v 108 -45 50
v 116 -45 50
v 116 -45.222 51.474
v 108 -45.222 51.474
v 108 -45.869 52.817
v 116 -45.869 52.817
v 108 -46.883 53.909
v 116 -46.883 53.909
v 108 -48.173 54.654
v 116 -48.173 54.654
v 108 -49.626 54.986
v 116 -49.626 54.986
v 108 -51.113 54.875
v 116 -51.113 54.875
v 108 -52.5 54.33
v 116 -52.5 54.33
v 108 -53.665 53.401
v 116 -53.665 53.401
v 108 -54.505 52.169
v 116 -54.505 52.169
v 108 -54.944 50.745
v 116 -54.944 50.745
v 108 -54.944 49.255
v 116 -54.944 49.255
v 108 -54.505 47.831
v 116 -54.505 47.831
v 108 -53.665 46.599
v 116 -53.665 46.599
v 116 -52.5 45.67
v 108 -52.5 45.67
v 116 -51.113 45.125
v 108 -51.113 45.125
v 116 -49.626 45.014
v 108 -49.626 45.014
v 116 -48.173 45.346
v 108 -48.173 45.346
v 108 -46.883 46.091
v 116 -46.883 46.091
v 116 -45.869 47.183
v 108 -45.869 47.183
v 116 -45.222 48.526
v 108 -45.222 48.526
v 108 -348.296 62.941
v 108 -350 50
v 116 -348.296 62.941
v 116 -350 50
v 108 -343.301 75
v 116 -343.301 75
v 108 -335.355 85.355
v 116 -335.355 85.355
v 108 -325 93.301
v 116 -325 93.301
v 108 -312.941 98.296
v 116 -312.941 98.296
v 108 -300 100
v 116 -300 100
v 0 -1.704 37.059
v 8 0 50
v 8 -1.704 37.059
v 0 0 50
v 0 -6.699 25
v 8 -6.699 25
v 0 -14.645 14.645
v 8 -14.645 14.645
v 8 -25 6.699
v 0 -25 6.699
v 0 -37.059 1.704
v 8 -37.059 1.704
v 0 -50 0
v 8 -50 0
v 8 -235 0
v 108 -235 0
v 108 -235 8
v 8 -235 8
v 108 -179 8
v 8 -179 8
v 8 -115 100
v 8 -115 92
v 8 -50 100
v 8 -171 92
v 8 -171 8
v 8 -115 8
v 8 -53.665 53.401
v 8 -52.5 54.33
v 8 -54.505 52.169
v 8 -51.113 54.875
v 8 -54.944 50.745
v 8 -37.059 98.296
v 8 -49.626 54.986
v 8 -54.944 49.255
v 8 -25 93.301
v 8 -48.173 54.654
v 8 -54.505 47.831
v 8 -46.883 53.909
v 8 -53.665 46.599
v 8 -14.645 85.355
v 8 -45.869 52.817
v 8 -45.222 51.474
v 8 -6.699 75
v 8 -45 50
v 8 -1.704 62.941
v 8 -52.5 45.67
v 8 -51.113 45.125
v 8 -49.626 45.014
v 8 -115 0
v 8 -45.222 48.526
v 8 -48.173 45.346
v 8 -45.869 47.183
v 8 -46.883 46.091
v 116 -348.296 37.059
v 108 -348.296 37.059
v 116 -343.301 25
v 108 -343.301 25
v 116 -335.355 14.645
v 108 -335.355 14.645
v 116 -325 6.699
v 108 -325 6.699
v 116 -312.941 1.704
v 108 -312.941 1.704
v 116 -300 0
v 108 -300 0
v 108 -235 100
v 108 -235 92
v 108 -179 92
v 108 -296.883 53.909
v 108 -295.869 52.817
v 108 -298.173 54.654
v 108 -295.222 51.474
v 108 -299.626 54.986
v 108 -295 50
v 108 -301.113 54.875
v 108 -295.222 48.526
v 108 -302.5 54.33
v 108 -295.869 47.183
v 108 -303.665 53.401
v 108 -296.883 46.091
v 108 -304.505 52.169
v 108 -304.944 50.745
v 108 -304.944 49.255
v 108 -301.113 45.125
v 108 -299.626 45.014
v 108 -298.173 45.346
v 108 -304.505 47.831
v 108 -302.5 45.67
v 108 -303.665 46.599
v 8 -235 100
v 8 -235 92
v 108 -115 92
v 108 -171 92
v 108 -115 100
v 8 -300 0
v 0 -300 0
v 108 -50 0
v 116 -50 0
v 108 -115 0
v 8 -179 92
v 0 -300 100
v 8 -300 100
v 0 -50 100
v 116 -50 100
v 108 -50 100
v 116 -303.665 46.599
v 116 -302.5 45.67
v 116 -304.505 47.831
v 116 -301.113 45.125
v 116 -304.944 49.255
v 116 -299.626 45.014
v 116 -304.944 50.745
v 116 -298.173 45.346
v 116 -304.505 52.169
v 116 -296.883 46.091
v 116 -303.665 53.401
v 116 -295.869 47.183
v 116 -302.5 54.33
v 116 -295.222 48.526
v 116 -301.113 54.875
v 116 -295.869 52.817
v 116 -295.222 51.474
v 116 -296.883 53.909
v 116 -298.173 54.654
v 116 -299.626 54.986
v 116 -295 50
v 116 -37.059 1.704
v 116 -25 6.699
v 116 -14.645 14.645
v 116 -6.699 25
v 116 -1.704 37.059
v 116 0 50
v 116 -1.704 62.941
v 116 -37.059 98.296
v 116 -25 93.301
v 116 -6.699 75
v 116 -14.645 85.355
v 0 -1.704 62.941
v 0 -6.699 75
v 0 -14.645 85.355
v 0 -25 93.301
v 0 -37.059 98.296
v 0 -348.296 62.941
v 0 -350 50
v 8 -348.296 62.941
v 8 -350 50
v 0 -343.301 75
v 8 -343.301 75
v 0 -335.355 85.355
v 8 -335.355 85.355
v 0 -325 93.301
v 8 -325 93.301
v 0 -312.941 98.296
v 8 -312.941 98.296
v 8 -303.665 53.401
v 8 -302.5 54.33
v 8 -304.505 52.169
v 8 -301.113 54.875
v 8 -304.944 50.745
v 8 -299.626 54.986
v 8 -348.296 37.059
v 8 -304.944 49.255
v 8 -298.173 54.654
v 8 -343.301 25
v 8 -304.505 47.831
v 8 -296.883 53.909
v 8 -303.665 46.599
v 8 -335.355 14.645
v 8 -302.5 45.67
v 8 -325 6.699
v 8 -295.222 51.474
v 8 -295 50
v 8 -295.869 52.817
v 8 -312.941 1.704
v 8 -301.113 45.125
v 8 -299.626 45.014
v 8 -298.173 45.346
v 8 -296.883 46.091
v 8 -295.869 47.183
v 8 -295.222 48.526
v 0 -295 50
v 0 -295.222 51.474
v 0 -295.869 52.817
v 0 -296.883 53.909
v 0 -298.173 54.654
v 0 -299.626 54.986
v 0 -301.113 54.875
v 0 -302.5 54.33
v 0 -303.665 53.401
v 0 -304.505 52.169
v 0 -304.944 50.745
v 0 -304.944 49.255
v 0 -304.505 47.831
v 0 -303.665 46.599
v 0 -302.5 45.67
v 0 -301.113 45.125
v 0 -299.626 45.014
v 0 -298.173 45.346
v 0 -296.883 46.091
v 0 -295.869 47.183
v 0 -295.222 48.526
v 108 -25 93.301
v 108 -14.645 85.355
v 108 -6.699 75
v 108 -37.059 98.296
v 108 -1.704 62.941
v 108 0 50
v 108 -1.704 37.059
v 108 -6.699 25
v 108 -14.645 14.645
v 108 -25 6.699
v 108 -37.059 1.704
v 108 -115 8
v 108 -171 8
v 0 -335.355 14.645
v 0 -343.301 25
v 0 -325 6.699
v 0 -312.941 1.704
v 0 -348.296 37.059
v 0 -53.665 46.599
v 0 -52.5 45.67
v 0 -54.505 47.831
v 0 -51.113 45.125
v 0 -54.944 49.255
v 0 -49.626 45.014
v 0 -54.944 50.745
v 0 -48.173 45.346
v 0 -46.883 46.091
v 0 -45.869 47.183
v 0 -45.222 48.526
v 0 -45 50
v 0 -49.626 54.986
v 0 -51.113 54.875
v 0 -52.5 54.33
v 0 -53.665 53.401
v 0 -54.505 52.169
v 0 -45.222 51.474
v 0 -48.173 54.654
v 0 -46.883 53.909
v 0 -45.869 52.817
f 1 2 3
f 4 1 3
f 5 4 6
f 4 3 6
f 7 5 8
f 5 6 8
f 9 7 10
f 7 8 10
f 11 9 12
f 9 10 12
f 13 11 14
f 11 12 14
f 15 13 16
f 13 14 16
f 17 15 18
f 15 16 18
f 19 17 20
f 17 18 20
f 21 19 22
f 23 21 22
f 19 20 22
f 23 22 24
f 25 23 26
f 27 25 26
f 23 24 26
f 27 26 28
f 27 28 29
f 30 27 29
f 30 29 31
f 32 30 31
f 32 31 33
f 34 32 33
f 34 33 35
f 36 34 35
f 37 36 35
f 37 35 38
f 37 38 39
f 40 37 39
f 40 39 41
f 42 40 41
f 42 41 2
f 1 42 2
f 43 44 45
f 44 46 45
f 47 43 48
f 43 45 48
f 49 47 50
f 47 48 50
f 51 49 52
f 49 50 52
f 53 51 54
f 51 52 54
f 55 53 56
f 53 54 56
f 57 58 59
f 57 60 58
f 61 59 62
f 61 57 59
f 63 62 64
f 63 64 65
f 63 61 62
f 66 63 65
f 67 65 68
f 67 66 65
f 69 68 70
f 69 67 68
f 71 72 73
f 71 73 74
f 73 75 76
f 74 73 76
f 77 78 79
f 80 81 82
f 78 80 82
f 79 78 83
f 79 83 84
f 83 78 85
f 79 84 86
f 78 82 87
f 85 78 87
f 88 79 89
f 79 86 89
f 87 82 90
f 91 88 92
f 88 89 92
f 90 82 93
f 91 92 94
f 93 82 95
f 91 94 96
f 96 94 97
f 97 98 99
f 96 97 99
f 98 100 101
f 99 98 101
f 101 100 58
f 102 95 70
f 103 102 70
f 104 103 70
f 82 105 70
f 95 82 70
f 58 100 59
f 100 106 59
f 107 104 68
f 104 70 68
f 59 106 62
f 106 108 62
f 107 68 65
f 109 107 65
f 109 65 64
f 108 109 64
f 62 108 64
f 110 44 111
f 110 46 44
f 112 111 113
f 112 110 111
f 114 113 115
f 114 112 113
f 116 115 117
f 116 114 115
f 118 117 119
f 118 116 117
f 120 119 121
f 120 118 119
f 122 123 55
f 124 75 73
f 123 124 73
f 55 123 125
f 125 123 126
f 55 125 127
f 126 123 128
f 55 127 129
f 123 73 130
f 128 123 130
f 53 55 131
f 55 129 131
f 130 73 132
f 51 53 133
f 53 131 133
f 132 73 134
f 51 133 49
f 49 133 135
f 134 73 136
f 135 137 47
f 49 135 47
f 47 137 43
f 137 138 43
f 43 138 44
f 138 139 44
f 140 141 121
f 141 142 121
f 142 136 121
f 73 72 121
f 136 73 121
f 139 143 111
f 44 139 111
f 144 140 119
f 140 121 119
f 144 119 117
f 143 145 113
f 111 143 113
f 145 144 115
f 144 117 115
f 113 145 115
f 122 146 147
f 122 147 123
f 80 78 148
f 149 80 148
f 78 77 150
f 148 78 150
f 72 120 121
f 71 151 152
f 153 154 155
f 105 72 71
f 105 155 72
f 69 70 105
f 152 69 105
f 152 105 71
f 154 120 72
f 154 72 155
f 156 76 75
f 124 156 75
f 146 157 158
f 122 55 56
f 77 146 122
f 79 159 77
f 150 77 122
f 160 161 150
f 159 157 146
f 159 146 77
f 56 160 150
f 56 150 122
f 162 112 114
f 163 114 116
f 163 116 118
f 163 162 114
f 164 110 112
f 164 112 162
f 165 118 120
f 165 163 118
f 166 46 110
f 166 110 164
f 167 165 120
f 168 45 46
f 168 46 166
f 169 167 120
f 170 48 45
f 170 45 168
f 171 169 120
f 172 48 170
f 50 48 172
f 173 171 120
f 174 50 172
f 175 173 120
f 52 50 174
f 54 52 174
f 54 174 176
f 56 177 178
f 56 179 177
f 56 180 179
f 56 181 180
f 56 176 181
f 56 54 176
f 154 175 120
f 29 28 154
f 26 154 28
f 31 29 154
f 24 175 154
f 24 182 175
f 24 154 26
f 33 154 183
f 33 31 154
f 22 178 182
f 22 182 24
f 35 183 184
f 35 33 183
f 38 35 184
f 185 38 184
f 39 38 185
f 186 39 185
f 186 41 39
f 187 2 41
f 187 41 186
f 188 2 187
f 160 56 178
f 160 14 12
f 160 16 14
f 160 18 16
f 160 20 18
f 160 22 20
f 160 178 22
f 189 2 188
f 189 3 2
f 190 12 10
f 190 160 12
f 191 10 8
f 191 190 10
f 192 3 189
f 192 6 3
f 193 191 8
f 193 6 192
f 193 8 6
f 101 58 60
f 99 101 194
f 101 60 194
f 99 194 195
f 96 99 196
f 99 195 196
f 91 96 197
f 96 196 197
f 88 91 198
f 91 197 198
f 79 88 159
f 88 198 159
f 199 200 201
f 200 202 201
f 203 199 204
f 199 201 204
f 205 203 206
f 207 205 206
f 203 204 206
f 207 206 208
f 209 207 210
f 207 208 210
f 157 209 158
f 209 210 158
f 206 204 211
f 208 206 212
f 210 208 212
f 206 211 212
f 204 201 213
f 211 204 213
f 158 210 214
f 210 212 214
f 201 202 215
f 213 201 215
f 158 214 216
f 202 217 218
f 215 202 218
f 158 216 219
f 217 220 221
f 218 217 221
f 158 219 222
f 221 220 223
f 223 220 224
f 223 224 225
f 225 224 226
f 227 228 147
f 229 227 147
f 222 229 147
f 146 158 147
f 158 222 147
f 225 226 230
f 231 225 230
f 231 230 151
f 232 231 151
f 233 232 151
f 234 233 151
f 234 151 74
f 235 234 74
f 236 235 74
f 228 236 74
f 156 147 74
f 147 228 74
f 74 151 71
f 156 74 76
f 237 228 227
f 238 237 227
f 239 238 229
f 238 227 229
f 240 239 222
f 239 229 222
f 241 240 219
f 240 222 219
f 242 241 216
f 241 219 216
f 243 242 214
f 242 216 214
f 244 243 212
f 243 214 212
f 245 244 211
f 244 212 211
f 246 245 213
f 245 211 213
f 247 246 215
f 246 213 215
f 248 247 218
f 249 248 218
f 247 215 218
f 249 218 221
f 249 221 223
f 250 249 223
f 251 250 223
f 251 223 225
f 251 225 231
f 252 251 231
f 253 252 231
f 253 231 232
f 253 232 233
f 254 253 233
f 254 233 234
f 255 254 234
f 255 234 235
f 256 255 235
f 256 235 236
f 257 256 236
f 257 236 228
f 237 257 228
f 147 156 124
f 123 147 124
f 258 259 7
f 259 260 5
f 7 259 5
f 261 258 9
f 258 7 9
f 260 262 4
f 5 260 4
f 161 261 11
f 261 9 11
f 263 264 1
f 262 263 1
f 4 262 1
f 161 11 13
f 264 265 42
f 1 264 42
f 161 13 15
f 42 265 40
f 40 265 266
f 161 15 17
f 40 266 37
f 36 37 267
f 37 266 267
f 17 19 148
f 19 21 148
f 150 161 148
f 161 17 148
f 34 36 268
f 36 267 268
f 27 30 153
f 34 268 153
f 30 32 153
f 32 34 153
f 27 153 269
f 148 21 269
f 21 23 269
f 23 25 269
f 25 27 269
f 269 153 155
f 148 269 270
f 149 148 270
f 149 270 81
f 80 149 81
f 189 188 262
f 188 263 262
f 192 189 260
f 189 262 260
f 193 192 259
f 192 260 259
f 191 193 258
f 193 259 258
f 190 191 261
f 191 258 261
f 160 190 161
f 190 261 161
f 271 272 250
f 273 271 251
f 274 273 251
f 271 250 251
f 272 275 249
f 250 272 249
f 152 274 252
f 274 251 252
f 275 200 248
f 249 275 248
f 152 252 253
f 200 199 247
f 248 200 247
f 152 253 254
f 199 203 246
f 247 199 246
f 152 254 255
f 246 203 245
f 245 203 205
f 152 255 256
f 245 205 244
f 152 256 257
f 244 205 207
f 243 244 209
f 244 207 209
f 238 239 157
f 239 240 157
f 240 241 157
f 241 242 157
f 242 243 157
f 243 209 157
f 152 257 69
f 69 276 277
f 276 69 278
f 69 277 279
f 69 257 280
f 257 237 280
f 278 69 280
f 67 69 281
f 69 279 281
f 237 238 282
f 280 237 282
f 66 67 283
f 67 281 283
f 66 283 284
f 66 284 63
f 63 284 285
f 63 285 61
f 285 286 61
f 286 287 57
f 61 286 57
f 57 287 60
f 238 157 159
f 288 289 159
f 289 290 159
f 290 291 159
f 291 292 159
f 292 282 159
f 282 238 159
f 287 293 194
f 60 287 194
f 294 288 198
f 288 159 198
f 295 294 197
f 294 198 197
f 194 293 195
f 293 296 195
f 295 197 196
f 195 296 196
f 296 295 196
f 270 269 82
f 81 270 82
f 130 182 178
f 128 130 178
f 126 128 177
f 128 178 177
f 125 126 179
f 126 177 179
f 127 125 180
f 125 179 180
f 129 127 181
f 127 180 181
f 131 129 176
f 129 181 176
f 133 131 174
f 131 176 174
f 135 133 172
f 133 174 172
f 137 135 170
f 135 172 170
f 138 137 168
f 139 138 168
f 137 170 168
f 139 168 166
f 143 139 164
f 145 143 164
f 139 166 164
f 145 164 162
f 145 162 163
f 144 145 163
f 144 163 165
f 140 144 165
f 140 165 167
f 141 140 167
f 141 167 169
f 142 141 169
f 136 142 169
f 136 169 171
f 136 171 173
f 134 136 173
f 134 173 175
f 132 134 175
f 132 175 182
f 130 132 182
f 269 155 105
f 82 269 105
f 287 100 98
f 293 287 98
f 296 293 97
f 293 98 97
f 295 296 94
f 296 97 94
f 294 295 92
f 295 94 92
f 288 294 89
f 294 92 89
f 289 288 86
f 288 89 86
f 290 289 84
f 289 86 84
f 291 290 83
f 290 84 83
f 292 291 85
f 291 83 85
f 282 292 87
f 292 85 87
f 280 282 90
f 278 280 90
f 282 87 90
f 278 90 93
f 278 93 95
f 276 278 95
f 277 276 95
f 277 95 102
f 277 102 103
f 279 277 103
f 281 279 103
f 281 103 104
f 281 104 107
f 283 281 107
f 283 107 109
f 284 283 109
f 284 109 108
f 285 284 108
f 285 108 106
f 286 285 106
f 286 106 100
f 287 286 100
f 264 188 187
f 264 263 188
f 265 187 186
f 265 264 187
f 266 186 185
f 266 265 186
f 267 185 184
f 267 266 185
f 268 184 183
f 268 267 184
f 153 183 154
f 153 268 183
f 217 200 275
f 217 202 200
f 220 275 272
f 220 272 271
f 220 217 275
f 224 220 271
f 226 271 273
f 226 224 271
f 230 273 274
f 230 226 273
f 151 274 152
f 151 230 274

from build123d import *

# Parameters (mm, degrees)
BOSS_EXTRUDE1_DEPTH = 100
FILLET1_R           = 50
SKETCH2_R           = 5
CUT_EXTRUDE1_DEPTH  = 116
SKETCH5_W           = 116
SKETCH5_H           = 120
BOSS_EXTRUDE4_DEPTH = 8
SKETCH6_W           = 100
SKETCH6_H           = 120
BOSS_EXTRUDE6_DEPTH = 8


with BuildPart() as part:
    # Sketch1 → Boss-Extrude1 (new body)
    with BuildSketch(Plane.XY):
        Polygon((8, -171), (8, -8), (8, 0), (0, 0), (0, -8), (0, -146), (0, -154), (0, -292), (0, -350), (8, -350), (8, -292), (8, -179), (108, -179), (108, -292), (108, -350), (116, -350), (116, -292), (116, -154), (116, -146), (116, -8), (116, 0), (108, 0), (108, -8), (108, -171), align=None)
    extrude(amount=BOSS_EXTRUDE1_DEPTH)

    # Fillet1
    fillet1_edges = [part.edges().sort_by_distance(p)[0] for p in [
        (4, 0, 100),
        (4, 0, 0),
        (112, -350, 0),
        (112, -350, 100),
        (4, -350, 100),
        (4, -350, 0),
        (112, 0, 100),
        (112, 0, 0),
    ]]
    fillet(fillet1_edges, radius=FILLET1_R - 0.0001)  # a hair under: the kernel refuses the full size

    # Sketch2 → Cut-Extrude1 (cut)
    with BuildSketch(Plane(origin=(116, 0, 0), x_dir=(0, 0, -1), z_dir=(1, 0, 0))):
        with Locations(Location((-50, -300, 0), (0, 0, 90))):
            Circle(SKETCH2_R)
        with Locations(Location((-50, -50, 0), (0, 0, 90))):
            Circle(SKETCH2_R)
    extrude(amount=-CUT_EXTRUDE1_DEPTH, mode=Mode.SUBTRACT)

    # Sketch5 → Boss-Extrude4 (add)
    with BuildSketch(Plane.XY.offset(100)):
        with Locations((58, -175)):
            Rectangle(SKETCH5_W, SKETCH5_H)
    extrude(amount=-BOSS_EXTRUDE4_DEPTH)

    # Sketch6 → Boss-Extrude6 (add)
    with BuildSketch(Plane(origin=(0, 0, 0), x_dir=(-1, 0, 0), z_dir=(0, 0, -1))):
        with Locations((-58, -175)):
            Rectangle(SKETCH6_W, SKETCH6_H)
    extrude(amount=-BOSS_EXTRUDE6_DEPTH)


solid = part.part
